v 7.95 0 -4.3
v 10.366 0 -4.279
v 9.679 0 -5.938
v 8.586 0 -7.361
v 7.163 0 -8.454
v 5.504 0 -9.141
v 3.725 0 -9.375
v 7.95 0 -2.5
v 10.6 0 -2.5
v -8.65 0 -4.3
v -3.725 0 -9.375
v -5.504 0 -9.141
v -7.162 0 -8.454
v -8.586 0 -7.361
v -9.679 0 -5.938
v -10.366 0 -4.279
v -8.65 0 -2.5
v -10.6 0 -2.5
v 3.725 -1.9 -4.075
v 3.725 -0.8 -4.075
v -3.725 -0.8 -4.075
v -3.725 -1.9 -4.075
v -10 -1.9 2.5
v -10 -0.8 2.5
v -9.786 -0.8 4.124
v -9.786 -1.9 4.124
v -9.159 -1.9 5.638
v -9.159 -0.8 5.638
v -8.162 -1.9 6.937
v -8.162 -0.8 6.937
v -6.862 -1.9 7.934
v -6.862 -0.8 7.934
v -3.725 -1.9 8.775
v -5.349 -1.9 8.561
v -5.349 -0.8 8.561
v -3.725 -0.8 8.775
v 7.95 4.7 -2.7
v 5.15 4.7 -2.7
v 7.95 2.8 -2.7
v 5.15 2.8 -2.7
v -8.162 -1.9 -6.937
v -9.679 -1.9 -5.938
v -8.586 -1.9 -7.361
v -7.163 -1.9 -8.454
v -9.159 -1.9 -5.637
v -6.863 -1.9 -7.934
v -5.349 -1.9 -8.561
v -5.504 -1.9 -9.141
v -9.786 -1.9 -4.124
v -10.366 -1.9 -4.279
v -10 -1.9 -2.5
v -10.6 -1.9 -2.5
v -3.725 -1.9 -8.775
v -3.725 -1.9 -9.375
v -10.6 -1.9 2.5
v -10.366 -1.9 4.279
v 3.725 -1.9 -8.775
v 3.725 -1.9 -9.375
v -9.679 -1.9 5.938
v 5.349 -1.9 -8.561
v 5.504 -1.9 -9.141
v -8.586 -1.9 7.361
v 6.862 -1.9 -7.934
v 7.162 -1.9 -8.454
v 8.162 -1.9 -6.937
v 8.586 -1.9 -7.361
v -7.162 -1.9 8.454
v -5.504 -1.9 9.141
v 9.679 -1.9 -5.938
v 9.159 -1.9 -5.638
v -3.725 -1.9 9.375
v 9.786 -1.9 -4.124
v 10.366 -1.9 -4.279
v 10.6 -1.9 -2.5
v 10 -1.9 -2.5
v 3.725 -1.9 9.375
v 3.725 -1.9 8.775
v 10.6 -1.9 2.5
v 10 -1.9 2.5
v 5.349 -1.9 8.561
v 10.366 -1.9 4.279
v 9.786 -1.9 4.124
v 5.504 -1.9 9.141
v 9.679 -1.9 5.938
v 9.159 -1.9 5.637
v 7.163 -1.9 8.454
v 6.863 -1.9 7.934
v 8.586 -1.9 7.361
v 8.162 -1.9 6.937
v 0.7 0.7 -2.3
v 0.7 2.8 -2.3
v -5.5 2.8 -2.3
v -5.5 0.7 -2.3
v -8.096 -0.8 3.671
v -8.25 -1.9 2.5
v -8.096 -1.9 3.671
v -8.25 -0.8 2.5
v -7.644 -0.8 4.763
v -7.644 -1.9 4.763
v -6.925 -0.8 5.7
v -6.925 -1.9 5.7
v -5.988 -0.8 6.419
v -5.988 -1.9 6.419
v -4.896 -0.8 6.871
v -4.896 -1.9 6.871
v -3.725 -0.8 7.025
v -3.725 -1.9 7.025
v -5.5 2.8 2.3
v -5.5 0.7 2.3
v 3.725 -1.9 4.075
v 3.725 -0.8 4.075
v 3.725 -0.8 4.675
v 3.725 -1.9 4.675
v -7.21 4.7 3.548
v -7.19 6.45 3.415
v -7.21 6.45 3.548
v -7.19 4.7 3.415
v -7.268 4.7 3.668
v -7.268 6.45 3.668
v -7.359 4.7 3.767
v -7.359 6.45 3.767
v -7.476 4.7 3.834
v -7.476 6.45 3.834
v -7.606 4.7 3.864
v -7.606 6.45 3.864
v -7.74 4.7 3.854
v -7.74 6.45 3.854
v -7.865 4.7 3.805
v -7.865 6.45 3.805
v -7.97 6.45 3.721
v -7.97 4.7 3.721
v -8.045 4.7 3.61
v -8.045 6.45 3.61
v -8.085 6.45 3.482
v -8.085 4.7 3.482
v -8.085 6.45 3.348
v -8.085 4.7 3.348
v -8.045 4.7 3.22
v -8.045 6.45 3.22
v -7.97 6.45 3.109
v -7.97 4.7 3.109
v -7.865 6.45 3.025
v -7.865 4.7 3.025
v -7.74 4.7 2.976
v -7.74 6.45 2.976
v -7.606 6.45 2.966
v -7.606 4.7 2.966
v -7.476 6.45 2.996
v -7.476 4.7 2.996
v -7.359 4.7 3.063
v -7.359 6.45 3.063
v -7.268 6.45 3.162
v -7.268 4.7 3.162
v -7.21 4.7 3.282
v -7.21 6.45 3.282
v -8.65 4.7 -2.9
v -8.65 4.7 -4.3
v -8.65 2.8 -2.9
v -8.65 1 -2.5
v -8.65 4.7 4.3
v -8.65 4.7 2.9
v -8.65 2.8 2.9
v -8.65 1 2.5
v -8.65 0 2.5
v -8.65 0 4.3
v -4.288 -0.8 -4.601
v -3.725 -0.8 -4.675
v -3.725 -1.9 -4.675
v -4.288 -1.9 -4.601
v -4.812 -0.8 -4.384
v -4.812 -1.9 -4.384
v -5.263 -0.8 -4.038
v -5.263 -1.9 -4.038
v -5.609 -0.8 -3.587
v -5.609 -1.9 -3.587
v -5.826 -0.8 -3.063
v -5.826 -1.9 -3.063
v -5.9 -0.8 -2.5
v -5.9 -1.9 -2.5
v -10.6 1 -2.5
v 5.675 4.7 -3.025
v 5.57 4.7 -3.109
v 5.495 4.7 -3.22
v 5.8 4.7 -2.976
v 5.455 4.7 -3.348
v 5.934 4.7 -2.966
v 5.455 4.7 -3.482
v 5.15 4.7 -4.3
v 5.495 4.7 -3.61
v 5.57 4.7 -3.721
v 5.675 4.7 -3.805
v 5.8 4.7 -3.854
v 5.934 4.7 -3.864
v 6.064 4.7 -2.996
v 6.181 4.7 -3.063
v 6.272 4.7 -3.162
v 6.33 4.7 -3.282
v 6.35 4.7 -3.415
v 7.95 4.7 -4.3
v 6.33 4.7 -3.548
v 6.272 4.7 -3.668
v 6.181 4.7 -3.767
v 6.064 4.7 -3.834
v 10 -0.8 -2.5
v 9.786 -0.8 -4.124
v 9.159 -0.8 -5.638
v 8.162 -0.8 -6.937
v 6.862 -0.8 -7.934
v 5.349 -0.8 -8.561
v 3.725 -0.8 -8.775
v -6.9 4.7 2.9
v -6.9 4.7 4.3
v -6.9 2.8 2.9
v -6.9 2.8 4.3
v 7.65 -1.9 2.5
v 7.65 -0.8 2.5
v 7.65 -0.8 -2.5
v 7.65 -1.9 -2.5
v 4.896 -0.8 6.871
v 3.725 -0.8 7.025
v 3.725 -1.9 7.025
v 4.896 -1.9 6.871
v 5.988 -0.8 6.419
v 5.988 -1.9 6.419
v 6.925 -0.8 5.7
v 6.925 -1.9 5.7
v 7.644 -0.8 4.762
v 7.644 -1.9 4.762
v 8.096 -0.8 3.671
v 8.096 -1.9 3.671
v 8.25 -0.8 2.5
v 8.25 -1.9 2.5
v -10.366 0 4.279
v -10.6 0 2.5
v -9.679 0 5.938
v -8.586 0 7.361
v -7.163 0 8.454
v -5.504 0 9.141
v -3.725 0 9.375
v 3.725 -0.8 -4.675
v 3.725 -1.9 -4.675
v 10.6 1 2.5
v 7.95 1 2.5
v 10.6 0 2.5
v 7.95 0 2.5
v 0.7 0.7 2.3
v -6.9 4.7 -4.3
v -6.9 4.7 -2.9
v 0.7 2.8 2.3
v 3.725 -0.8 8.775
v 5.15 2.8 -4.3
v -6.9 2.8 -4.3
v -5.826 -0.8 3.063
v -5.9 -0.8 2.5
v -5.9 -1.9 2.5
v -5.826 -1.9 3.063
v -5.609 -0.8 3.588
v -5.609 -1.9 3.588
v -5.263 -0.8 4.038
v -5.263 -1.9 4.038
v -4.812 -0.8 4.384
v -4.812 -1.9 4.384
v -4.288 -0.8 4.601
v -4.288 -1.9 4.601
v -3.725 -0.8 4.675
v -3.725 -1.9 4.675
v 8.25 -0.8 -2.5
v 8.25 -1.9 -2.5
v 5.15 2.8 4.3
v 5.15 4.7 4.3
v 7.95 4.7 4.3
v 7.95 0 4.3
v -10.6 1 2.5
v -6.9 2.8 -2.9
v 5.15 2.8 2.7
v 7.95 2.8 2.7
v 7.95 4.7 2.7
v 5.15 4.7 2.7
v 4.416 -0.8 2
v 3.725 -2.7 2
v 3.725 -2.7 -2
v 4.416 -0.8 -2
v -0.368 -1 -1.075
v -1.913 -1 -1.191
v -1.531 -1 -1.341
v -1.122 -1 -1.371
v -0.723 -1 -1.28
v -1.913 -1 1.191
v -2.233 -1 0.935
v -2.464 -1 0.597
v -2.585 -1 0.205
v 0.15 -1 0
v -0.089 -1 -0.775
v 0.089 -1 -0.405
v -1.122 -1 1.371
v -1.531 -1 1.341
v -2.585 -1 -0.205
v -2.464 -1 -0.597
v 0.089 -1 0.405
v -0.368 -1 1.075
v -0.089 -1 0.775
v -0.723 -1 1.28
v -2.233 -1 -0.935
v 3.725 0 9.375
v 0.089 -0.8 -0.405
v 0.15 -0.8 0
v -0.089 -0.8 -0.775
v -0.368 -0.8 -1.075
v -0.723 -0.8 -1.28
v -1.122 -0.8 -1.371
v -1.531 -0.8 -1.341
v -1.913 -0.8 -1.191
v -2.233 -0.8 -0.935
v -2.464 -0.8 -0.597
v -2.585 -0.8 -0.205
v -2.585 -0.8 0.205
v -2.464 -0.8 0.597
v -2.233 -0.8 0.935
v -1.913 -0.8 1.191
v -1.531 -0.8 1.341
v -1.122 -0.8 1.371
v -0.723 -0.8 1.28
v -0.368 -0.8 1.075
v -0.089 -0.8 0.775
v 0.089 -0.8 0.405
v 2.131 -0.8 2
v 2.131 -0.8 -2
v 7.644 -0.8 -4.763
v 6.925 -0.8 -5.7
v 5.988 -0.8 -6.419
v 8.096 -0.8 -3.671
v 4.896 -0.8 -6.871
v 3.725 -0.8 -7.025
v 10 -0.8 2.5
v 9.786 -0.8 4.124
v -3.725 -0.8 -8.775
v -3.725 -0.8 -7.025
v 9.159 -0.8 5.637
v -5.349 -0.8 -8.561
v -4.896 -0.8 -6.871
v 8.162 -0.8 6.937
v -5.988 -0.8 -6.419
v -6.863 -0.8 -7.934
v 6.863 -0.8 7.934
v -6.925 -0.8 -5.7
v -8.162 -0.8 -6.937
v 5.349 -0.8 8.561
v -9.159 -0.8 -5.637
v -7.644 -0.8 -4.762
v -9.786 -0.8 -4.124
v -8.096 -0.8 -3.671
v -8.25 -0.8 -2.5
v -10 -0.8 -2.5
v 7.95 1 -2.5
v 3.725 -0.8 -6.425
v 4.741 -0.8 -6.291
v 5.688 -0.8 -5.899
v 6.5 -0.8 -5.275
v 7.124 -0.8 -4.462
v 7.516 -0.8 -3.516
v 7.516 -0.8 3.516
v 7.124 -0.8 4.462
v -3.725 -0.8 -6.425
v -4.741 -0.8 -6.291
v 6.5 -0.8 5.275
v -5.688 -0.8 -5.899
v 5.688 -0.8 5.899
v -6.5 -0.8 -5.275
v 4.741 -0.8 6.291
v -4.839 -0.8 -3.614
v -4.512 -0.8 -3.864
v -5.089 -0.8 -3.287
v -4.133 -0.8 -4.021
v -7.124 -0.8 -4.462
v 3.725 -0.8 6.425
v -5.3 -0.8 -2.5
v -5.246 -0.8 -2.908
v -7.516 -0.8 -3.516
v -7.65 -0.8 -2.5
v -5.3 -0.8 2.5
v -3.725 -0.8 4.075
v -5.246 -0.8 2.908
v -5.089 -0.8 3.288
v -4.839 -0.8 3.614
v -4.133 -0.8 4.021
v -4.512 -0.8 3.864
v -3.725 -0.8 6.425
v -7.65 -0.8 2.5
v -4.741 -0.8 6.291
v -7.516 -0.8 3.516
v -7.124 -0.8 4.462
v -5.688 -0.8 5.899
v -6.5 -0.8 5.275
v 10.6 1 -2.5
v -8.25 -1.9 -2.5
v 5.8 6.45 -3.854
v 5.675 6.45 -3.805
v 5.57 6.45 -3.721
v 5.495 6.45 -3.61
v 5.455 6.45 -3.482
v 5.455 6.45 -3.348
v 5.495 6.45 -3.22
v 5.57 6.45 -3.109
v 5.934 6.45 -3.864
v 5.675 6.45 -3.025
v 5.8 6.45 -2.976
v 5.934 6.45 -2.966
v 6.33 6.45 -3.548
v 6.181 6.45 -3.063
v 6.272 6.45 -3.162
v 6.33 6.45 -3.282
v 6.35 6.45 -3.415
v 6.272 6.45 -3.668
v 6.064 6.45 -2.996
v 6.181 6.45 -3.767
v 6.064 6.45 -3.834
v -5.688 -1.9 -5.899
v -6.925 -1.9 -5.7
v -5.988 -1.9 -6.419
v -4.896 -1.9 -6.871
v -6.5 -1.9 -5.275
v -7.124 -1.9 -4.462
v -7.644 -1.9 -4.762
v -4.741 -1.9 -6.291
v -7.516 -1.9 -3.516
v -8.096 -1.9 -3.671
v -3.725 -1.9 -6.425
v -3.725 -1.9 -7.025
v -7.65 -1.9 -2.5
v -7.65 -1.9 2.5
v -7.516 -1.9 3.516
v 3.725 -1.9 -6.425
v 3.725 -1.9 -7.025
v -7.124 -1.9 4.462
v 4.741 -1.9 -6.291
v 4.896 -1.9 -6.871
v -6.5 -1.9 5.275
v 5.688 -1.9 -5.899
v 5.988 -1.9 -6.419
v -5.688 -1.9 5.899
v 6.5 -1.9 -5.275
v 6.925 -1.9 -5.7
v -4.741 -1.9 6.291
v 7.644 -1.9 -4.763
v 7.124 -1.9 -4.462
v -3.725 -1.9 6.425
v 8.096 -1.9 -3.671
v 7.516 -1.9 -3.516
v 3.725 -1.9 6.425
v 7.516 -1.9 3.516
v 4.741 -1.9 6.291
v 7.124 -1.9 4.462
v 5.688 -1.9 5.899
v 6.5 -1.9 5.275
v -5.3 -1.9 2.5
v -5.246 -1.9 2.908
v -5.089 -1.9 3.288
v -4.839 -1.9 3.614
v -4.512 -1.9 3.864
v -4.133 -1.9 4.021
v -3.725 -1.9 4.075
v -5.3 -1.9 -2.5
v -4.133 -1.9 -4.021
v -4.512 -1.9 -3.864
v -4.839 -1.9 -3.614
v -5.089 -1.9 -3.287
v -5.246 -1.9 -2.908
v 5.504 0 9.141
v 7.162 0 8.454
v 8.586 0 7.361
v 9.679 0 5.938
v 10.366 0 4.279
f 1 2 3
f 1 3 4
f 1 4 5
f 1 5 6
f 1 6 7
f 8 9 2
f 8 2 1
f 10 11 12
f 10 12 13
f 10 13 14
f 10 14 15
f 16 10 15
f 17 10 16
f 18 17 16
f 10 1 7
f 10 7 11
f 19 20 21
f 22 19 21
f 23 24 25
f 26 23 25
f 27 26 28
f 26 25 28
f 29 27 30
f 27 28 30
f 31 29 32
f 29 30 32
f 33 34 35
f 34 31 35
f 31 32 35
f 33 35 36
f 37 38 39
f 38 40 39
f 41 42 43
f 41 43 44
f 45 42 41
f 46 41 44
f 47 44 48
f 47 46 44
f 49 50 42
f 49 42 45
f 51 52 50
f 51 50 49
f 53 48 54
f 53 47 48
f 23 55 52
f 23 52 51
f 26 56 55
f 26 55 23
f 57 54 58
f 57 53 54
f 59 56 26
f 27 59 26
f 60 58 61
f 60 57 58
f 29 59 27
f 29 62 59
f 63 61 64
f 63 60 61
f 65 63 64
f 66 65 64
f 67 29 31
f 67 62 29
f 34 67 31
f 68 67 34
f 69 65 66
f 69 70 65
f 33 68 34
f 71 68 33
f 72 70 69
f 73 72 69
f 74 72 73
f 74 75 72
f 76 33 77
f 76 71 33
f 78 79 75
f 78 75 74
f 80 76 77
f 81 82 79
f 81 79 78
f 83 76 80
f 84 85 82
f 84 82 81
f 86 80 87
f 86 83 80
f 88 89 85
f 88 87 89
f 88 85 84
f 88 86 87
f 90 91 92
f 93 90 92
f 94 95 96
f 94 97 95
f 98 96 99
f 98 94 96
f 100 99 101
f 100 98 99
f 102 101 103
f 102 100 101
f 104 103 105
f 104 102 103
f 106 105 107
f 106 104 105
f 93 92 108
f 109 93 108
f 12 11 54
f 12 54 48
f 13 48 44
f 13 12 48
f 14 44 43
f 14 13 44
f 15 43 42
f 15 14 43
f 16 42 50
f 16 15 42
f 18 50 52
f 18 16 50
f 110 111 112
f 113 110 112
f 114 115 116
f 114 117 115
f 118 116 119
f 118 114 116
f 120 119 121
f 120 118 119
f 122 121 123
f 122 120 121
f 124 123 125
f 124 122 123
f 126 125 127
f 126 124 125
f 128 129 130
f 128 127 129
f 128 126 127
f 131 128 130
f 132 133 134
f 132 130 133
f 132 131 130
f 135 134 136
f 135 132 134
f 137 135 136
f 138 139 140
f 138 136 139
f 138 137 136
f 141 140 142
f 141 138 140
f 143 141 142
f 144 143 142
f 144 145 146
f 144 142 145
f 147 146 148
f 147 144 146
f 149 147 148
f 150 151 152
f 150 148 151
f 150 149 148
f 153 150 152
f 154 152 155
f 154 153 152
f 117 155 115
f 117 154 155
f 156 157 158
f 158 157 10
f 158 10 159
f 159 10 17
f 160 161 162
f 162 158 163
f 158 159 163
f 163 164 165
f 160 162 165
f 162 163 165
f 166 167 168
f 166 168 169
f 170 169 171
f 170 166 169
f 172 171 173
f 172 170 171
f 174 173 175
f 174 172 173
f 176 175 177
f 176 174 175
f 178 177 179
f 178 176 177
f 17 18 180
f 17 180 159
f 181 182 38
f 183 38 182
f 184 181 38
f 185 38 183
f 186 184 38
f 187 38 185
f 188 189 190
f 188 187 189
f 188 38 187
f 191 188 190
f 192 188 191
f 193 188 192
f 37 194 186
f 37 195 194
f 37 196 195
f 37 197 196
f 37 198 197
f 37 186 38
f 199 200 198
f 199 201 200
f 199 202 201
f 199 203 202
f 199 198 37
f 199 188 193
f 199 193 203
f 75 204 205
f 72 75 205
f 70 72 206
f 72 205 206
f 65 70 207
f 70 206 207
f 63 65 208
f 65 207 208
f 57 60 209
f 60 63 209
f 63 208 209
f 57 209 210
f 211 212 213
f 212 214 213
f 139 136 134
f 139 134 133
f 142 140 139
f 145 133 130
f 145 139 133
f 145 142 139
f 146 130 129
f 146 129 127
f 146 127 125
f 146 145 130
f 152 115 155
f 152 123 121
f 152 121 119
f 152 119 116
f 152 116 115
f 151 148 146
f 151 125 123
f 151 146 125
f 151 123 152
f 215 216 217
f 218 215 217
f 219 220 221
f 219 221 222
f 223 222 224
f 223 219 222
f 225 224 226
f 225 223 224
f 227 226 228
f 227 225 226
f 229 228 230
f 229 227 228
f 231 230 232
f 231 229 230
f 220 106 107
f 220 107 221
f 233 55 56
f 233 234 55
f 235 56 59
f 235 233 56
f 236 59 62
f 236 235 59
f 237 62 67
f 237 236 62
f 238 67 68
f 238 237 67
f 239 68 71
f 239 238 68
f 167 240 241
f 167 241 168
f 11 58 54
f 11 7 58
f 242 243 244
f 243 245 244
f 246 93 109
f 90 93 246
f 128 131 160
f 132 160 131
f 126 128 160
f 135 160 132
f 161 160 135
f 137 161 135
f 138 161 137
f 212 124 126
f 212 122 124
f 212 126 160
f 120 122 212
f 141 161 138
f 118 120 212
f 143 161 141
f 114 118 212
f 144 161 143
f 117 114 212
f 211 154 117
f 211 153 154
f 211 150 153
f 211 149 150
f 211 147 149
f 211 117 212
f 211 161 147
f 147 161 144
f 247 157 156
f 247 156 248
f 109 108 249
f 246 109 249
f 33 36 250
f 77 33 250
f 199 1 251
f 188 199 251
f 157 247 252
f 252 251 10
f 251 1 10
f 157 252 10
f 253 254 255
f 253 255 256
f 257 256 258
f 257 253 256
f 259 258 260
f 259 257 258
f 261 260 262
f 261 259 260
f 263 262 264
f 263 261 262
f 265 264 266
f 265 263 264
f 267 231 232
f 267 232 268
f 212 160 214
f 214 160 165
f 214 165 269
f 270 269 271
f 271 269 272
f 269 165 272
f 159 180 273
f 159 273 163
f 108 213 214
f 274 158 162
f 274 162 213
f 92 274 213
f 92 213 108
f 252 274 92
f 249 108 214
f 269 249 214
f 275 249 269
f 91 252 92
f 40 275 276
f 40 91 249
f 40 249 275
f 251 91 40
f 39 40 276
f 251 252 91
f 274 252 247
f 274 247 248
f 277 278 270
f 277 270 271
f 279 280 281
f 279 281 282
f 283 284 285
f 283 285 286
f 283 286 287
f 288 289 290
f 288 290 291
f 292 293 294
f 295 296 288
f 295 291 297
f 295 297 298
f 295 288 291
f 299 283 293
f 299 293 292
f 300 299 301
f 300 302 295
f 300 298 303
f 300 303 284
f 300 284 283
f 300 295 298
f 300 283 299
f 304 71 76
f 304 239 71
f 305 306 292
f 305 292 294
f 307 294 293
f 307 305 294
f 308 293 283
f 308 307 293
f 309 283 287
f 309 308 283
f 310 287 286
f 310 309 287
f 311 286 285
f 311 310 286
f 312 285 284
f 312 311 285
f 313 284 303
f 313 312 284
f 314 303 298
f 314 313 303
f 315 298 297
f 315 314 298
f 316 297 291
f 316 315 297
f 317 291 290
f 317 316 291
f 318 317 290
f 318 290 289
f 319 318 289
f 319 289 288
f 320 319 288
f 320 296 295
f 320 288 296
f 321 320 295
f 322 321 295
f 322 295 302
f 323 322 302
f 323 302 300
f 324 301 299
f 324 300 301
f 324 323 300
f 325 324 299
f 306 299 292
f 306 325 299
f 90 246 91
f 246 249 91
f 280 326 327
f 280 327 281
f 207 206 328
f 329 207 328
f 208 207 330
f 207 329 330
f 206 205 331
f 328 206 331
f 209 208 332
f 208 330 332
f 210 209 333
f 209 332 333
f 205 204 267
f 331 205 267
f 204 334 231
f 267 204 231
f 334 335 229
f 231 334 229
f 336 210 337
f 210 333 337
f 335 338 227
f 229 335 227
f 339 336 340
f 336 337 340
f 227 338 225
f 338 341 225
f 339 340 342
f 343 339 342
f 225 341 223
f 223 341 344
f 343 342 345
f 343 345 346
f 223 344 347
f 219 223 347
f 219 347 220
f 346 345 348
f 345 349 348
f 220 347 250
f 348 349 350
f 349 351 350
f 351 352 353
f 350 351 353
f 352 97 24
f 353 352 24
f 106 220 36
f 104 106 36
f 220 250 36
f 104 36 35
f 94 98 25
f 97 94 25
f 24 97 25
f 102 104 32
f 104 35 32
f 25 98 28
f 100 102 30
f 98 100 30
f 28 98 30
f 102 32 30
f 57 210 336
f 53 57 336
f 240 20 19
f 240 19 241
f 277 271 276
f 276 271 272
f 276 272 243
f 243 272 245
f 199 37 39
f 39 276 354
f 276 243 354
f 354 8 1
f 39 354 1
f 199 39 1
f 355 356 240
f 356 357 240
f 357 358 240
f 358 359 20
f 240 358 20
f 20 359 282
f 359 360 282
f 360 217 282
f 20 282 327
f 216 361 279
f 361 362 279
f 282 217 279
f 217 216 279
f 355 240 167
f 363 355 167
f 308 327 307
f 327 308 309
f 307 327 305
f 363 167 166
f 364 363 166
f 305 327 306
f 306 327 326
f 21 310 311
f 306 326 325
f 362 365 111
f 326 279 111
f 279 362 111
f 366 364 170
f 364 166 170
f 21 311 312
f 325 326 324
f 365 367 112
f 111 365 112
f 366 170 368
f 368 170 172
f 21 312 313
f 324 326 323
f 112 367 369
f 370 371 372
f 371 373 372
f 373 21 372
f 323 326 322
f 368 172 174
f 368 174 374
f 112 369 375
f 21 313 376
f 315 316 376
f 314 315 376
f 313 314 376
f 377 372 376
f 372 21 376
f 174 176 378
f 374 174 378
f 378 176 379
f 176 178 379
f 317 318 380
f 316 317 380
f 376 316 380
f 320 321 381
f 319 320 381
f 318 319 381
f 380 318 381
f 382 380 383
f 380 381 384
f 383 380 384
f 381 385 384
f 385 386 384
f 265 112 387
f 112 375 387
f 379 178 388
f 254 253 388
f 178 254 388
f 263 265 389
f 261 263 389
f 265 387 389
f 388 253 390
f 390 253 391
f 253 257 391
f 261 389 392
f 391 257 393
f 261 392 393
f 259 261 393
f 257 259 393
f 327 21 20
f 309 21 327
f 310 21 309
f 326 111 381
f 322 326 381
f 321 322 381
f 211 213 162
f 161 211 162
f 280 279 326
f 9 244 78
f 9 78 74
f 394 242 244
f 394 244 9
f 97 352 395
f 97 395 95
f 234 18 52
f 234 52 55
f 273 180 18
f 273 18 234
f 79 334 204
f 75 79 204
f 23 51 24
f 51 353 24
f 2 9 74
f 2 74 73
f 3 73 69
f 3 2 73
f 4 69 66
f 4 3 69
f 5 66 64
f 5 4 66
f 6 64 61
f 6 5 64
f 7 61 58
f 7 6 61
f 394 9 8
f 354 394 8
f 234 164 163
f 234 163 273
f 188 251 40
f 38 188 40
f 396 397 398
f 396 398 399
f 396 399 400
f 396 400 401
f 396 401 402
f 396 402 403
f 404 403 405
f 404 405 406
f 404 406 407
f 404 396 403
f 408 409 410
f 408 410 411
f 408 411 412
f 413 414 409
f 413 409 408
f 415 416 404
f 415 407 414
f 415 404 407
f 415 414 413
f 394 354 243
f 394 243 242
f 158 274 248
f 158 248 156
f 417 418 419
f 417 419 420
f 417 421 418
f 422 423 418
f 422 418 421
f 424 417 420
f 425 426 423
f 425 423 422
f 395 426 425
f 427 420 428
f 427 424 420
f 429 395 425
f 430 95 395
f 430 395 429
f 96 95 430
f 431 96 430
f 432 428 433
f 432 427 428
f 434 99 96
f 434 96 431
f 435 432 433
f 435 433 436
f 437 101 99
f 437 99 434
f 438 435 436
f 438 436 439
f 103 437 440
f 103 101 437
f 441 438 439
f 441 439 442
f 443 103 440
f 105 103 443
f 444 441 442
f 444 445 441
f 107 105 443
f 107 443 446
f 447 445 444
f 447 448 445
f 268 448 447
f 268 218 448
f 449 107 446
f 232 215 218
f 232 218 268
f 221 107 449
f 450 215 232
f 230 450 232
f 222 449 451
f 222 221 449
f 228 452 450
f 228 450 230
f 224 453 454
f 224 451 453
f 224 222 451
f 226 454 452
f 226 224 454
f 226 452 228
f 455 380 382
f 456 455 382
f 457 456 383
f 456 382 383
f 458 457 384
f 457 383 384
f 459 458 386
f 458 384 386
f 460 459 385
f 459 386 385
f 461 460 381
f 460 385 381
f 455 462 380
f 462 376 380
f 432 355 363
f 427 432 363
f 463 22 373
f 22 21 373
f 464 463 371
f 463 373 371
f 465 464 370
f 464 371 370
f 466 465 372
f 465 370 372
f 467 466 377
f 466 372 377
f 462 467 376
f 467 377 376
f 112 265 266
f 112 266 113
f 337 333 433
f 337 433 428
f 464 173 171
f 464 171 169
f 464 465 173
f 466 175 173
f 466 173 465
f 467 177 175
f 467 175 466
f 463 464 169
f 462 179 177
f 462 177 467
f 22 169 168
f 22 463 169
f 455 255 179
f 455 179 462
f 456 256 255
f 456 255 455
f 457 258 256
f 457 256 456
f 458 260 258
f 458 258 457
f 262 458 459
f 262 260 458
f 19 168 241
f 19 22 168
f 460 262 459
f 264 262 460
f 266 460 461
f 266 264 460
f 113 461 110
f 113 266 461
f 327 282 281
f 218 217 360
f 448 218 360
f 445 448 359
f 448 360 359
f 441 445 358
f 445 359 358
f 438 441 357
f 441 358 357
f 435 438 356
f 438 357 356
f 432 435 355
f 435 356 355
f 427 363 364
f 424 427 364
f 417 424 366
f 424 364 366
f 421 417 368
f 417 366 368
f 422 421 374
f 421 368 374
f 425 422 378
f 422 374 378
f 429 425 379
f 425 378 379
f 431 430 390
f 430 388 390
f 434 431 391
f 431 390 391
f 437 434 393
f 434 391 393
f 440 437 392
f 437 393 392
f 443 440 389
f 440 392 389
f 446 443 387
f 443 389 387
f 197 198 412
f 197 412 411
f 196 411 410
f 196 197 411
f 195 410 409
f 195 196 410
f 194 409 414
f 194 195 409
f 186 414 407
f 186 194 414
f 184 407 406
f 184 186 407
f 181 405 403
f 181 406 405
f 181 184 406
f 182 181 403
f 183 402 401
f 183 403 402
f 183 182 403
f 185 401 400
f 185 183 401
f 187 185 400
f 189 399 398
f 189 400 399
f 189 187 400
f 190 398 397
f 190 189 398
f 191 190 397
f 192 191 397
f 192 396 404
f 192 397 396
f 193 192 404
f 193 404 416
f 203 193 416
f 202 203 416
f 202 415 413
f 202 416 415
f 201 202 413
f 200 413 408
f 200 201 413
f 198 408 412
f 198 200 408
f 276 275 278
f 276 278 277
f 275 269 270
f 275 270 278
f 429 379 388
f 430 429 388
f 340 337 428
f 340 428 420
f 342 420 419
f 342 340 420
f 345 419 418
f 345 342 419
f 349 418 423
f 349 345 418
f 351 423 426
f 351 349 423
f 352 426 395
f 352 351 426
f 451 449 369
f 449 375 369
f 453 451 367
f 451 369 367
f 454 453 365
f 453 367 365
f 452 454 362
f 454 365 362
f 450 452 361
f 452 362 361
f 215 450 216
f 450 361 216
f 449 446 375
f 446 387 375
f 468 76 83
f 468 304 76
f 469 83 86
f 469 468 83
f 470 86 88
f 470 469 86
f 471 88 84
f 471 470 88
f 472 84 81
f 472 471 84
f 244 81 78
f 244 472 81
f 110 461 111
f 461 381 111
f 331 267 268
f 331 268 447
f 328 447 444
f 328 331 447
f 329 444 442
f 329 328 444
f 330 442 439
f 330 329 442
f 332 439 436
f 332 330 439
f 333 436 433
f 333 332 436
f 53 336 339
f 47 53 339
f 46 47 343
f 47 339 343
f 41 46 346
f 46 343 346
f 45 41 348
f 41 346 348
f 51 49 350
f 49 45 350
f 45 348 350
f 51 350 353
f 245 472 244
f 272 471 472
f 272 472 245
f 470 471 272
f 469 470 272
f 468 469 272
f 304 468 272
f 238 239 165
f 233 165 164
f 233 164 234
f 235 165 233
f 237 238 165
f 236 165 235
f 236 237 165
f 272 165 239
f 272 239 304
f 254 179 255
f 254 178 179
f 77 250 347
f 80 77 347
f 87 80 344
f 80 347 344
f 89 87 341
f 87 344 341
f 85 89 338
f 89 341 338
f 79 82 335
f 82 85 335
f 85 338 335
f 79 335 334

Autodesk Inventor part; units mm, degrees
ref_plane "YZ Plane" through (0, 0, 0) normal (1, 0, 0) x (0, 1, 0)
ref_plane "XZ Plane" through (0, 0, 0) normal (0, 1, 0) x (-1, 0, 0)
sketch "Sketch1" plane through (0, 0, 0) normal (0, 1, 0) x (-1, 0, 0)
  line L0 (3.725, 9.375) -> (-3.725, 9.375)
  line L1 (-10.6, 2.5) -> (-10.6, -2.5)
  line L2 (-3.725, -9.375) -> (3.725, -9.375)
  line L3 (10.6, -2.5) -> (10.6, 2.5)
  line L4 (16.8334, 0) -> (-16.8334, 0) construction
  line L5 (0, -15.1184) -> (0, 15.1184) construction
  arc A0 (10.6, 2.5) -> (3.725, 9.375) centre (3.725, 2.5) ccw
  arc A1 (3.725, -9.375) -> (10.6, -2.5) centre (3.725, -2.5) ccw
  arc A2 (-10.6, -2.5) -> (-3.725, -9.375) centre (-3.725, -2.5) ccw
  arc A3 (-3.725, 9.375) -> (-10.6, 2.5) centre (-3.725, 2.5) ccw
  point P0 (0, 0)
  point P1 (-10.6, -9.375)
  point P2 (-10.6, 9.375)
  point P3 (10.6, -9.375)
  dimension "d0" = 21.2
  dimension "d1" = 18.75
  dimension "d2" = 6.875
extrude "Extrusion1" add sketch "Sketch1" against normal blind 0.8
sketch "Sketch2" plane through (0, -0.8, 0) normal (0, -1, 0) x (1, 0, 0)
  line L0 (10.6, -2.5) -> (10.6, 2.5) projected
  arc A0 (10.6, 2.5) -> (3.725, 9.375) centre (3.725, 2.5) ccw projected
  arc A1 (3.725, -9.375) -> (10.6, -2.5) centre (3.725, -2.5) ccw projected
  line L1 (-3.725, -9.375) -> (3.725, -9.375) projected
  arc A2 (-10.6, -2.5) -> (-3.725, -9.375) centre (-3.725, -2.5) ccw projected
  line L2 (-10.6, 2.5) -> (-10.6, -2.5) projected
  arc A3 (-3.725, 9.375) -> (-10.6, 2.5) centre (-3.725, 2.5) ccw projected
  line L3 (3.725, 9.375) -> (-3.725, 9.375) projected
  arc A4 (10, 2.5) -> (3.725, 8.775) centre (3.725, 2.5) ccw
  line L4 (10, 2.5) -> (10, -2.5)
  arc A5 (3.725, -8.775) -> (10, -2.5) centre (3.725, -2.5) ccw
  line L5 (3.725, -8.775) -> (-3.725, -8.775)
  arc A6 (-10, -2.5) -> (-3.725, -8.775) centre (-3.725, -2.5) ccw
  line L6 (-10, -2.5) -> (-10, 2.5)
  arc A7 (-3.725, 8.775) -> (-10, 2.5) centre (-3.725, 2.5) ccw
  line L7 (-3.725, 8.775) -> (3.725, 8.775)
  arc A8 (8.25, 2.5) -> (3.725, 7.025) centre (3.725, 2.5) ccw
  line L8 (8.25, 2.5) -> (8.25, -2.5)
  arc A9 (3.725, -7.025) -> (8.25, -2.5) centre (3.725, -2.5) ccw
  line L9 (3.725, -7.025) -> (-3.725, -7.025)
  arc A10 (-8.25, -2.5) -> (-3.725, -7.025) centre (-3.725, -2.5) ccw
  line L10 (-8.25, -2.5) -> (-8.25, 2.5)
  arc A11 (-3.725, 7.025) -> (-8.25, 2.5) centre (-3.725, 2.5) ccw
  line L11 (-3.725, 7.025) -> (3.725, 7.025)
  arc A12 (7.65, 2.5) -> (3.725, 6.425) centre (3.725, 2.5) ccw
  line L12 (7.65, 2.5) -> (7.65, -2.5)
  arc A13 (3.725, -6.425) -> (7.65, -2.5) centre (3.725, -2.5) ccw
  line L13 (3.725, -6.425) -> (-3.725, -6.425)
  arc A14 (-7.65, -2.5) -> (-3.725, -6.425) centre (-3.725, -2.5) ccw
  line L14 (-7.65, -2.5) -> (-7.65, 2.5)
  arc A15 (-3.725, 6.425) -> (-7.65, 2.5) centre (-3.725, 2.5) ccw
  line L15 (-3.725, 6.425) -> (3.725, 6.425)
  arc A16 (5.9, 2.5) -> (3.725, 4.675) centre (3.725, 2.5) ccw
  line L16 (5.9, 2.5) -> (5.9, -2.5)
  arc A17 (3.725, -4.675) -> (5.9, -2.5) centre (3.725, -2.5) ccw
  line L17 (3.725, -4.675) -> (-3.725, -4.675)
  arc A18 (-5.9, -2.5) -> (-3.725, -4.675) centre (-3.725, -2.5) ccw
  line L18 (-5.9, -2.5) -> (-5.9, 2.5)
  arc A19 (-3.725, 4.675) -> (-5.9, 2.5) centre (-3.725, 2.5) ccw
  line L19 (-3.725, 4.675) -> (3.725, 4.675)
  arc A20 (5.3, 2.5) -> (3.725, 4.075) centre (3.725, 2.5) ccw
  line L20 (5.3, 2.5) -> (5.3, -2.5)
  arc A21 (3.725, -4.075) -> (5.3, -2.5) centre (3.725, -2.5) ccw
  line L21 (3.725, -4.075) -> (-3.725, -4.075)
  arc A22 (-5.3, -2.5) -> (-3.725, -4.075) centre (-3.725, -2.5) ccw
  line L22 (-5.3, -2.5) -> (-5.3, 2.5)
  arc A23 (-3.725, 4.075) -> (-5.3, 2.5) centre (-3.725, 2.5) ccw
  line L23 (-3.725, 4.075) -> (3.725, 4.075)
  line L24 (3.725, 4.075) -> (3.725, 4.675)
  line L25 (3.725, -4.075) -> (3.725, -4.675)
  point P0 (0, 0)
  dimension "d5" = 0.6
  dimension "d6" = 1.75
  dimension "d7" = 0.6
  dimension "d8" = 1.75
  dimension "d9" = 0.6
extrude "Extrusion2" add sketch "Sketch2" along normal blind 1.1 contours A1 L1 A2 L2 A3 L3 A0 L0 | L8 A9 L9 A10 L10 A11 L11 A8 | L24 L23 A23 L22 A22 L21 L25 L17 A18 L18 A19 L19
sketch "Sketch3" plane through (0, 0, 0) normal (0, 1, 0) x (1, 0, 0)
  line L0 (7.95, 4.3) -> (-8.65, 4.3)
  line L1 (-8.65, 4.3) -> (-8.65, -4.3)
  line L2 (-8.65, -4.3) -> (7.95, -4.3)
  line L3 (7.95, -4.3) -> (7.95, 4.3)
  line L4 (-14.84, 0) -> (14.84, 0) construction
  line L5 (-10.6, 2.5) -> (-10.6, -2.5) projected
  point P0 (0, 0)
  dimension "d12" = 16.6
  dimension "d13" = 8.6
  dimension "d14" = 1.95
extrude "Extrusion3" add sketch "Sketch3" along normal blind 2.8
sketch "Sketch4" plane through (0, 2.8, 0) normal (0, 1, 0) x (1, 0, 0)
  line L0 (0.7, 2.3) -> (-5.5, 2.3)
  line L1 (-5.5, 2.3) -> (-5.5, -2.3)
  line L2 (-5.5, -2.3) -> (0.7, -2.3)
  line L3 (0.7, -2.3) -> (0.7, 2.3)
  line L4 (-14.84, 0) -> (14.84, 0) construction
  line L5 (-8.65, 4.3) -> (-8.65, -4.3) projected
  point P0 (0, 0)
  dimension "d17" = 6.2
  dimension "d18" = 4.6
  dimension "d19" = 3.15
extrude "Extrusion4" cut sketch "Sketch4" against normal blind 2.1
sketch "Sketch5" plane through (0, 2.8, 0) normal (0, 1, 0) x (1, 0, 0)
  line L0 (-8.65, 4.3) -> (7.95, 4.3) projected
  line L1 (7.95, 4.3) -> (5.15, 4.3)
  line L2 (5.15, 4.3) -> (5.15, 2.7)
  line L3 (5.15, 2.7) -> (7.95, 2.7)
  line L4 (7.95, 2.7) -> (7.95, 4.3)
  line L5 (-8.65, -4.3) -> (7.95, -4.3) projected
  line L6 (7.95, -4.3) -> (5.15, -4.3)
  line L7 (5.15, -4.3) -> (5.15, -2.7)
  line L8 (5.15, -2.7) -> (7.95, -2.7)
  line L9 (7.95, -2.7) -> (7.95, -4.3)
  line L10 (-8.65, 4.3) -> (-8.65, -4.3) projected
  line L11 (-8.65, -4.3) -> (-6.9, -4.3)
  line L12 (-6.9, -4.3) -> (-6.9, -2.9)
  line L13 (-6.9, -2.9) -> (-8.65, -2.9)
  line L14 (-8.65, -2.9) -> (-8.65, -4.3)
  line L15 (-8.65, 4.3) -> (-6.9, 4.3)
  line L16 (-6.9, 4.3) -> (-6.9, 2.9)
  line L17 (-6.9, 2.9) -> (-8.65, 2.9)
  line L18 (-8.65, 2.9) -> (-8.65, 4.3)
  point P0 (0, 0)
  dimension "d22" = 2.8
  dimension "d23" = 1.6
  dimension "d24" = 2.8
  dimension "d25" = 1.6
  dimension "d26" = 1.75
  dimension "d27" = 1.4
  dimension "d28" = 1.75
  dimension "d29" = 1.4
extrude "Extrusion5" add sketch "Sketch5" along normal blind 1.9
sketch "Sketch6" plane through (0, 0, 0) normal (0, 1, 0) x (1, 0, 0)
  arc A0 (-3.725, 9.375) -> (-10.6, 2.5) centre (-3.725, 2.5) ccw projected
  line L0 (-8.65, -4.3) -> (-8.65, 4.3) projected
  line L1 (-10.6, 2.5) -> (-8.65, 2.5)
  line L2 (-8.65, 2.5) -> (-8.65, -2.5)
  line L3 (-8.65, -2.5) -> (-10.6, -2.5)
  line L4 (-10.6, -2.5) -> (-10.6, 2.5)
  line L5 (10.6, 2.5) -> (10.6, -2.5) projected
  line L6 (7.95, 4.3) -> (7.95, -4.3) projected
  line L7 (10.6, 2.5) -> (7.95, 2.5)
  line L8 (7.95, 2.5) -> (7.95, -2.5)
  line L9 (7.95, -2.5) -> (10.6, -2.5)
  line L10 (10.6, -2.5) -> (10.6, 2.5)
  point P0 (0, 0)
  dimension "d32" = 5
  dimension "d33" = 5
extrude "Extrusion6" add sketch "Sketch6" along normal blind 1
sketch "Sketch7" plane through (0, 4.7, 0) normal (0, 1, 0) x (1, 0, 0)
  circle A0 centre (5.9, 3.415) radius 0.45
  circle A1 centre (-7.64, -3.415) radius 0.45
  line L0 (5.15, 4.3) -> (5.15, 2.7) projected
  line L1 (-6.9, -4.3) -> (-6.9, -2.9) projected
  line L2 (5.15, 2.7) -> (7.95, 2.7) projected
  line L3 (-6.9, -2.9) -> (-8.65, -2.9) projected
  point P0 (0, 0)
  point P1 (5.15, 3.5)
  point P2 (-6.9, -3.6)
  point P3 (6.55, 2.7)
  point P4 (-7.775, -2.9)
  dimension "d36" = 0.9
  dimension "d37" = 0.9
  dimension "d48" = 13.54
  dimension "d49" = 6.83
  dimension "d50" = 3.415
  dimension "d52" = 5.9
extrude "Extrusion7" add sketch "Sketch7" along normal blind 1.75
ref_plane "Work Plane1" through (3.725, -0.8, 0) normal (0, 0, -1) x (-1, 0, 0)
sketch "Sketch8" plane through (3.725, -0.8, 0) normal (0, 0, -1) x (-1, 0, 0)
  line L0 (0, 0) -> (0, -1.1) construction
  line L1 (1.5943, 0) -> (0, -1.9)
  line L2 (0, -1.9) -> (-0.6915, 0)
  line L3 (7.45, -1.1) -> (0, -1.1) construction
  line L4 (0, 0) -> (7.45, 0) projected
  line L5 (-3.925, 0) -> (0, 0) projected
  point P0 (3.725, 0.8)
  dimension "d40" = 0.8
  dimension "d41" = 60
  dimension "d42" = 70
extrude "Extrusion8" add sketch "Sketch8" along normal mid plane 4
sketch "Sketch9" plane through (0, -0.8, 0) normal (0, -1, 0) x (1, 0, 0)
  circle A0 centre (-1.225, 0) radius 1.375
  arc A1 (-3.725, 4.075) -> (-5.3, 2.5) centre (-3.725, 2.5) ccw projected
  arc A2 (-5.3, -2.5) -> (-3.725, -4.075) centre (-3.725, -2.5) ccw projected
  line L0 (-3.725, 2.5) -> (-1.225, 0) construction
  line L1 (-1.225, 0) -> (-3.725, -2.5) construction
  point P0 (0, 0)
  dimension "d45" = 2.75
extrude "Extrusion9" add sketch "Sketch9" along normal blind 0.2
equation "\"d29\" = d27"
equation "\"d50\" = 0.5 * d49"
properties part number "LM19-LSI_lens" material "Polycarbonate, Clear"
